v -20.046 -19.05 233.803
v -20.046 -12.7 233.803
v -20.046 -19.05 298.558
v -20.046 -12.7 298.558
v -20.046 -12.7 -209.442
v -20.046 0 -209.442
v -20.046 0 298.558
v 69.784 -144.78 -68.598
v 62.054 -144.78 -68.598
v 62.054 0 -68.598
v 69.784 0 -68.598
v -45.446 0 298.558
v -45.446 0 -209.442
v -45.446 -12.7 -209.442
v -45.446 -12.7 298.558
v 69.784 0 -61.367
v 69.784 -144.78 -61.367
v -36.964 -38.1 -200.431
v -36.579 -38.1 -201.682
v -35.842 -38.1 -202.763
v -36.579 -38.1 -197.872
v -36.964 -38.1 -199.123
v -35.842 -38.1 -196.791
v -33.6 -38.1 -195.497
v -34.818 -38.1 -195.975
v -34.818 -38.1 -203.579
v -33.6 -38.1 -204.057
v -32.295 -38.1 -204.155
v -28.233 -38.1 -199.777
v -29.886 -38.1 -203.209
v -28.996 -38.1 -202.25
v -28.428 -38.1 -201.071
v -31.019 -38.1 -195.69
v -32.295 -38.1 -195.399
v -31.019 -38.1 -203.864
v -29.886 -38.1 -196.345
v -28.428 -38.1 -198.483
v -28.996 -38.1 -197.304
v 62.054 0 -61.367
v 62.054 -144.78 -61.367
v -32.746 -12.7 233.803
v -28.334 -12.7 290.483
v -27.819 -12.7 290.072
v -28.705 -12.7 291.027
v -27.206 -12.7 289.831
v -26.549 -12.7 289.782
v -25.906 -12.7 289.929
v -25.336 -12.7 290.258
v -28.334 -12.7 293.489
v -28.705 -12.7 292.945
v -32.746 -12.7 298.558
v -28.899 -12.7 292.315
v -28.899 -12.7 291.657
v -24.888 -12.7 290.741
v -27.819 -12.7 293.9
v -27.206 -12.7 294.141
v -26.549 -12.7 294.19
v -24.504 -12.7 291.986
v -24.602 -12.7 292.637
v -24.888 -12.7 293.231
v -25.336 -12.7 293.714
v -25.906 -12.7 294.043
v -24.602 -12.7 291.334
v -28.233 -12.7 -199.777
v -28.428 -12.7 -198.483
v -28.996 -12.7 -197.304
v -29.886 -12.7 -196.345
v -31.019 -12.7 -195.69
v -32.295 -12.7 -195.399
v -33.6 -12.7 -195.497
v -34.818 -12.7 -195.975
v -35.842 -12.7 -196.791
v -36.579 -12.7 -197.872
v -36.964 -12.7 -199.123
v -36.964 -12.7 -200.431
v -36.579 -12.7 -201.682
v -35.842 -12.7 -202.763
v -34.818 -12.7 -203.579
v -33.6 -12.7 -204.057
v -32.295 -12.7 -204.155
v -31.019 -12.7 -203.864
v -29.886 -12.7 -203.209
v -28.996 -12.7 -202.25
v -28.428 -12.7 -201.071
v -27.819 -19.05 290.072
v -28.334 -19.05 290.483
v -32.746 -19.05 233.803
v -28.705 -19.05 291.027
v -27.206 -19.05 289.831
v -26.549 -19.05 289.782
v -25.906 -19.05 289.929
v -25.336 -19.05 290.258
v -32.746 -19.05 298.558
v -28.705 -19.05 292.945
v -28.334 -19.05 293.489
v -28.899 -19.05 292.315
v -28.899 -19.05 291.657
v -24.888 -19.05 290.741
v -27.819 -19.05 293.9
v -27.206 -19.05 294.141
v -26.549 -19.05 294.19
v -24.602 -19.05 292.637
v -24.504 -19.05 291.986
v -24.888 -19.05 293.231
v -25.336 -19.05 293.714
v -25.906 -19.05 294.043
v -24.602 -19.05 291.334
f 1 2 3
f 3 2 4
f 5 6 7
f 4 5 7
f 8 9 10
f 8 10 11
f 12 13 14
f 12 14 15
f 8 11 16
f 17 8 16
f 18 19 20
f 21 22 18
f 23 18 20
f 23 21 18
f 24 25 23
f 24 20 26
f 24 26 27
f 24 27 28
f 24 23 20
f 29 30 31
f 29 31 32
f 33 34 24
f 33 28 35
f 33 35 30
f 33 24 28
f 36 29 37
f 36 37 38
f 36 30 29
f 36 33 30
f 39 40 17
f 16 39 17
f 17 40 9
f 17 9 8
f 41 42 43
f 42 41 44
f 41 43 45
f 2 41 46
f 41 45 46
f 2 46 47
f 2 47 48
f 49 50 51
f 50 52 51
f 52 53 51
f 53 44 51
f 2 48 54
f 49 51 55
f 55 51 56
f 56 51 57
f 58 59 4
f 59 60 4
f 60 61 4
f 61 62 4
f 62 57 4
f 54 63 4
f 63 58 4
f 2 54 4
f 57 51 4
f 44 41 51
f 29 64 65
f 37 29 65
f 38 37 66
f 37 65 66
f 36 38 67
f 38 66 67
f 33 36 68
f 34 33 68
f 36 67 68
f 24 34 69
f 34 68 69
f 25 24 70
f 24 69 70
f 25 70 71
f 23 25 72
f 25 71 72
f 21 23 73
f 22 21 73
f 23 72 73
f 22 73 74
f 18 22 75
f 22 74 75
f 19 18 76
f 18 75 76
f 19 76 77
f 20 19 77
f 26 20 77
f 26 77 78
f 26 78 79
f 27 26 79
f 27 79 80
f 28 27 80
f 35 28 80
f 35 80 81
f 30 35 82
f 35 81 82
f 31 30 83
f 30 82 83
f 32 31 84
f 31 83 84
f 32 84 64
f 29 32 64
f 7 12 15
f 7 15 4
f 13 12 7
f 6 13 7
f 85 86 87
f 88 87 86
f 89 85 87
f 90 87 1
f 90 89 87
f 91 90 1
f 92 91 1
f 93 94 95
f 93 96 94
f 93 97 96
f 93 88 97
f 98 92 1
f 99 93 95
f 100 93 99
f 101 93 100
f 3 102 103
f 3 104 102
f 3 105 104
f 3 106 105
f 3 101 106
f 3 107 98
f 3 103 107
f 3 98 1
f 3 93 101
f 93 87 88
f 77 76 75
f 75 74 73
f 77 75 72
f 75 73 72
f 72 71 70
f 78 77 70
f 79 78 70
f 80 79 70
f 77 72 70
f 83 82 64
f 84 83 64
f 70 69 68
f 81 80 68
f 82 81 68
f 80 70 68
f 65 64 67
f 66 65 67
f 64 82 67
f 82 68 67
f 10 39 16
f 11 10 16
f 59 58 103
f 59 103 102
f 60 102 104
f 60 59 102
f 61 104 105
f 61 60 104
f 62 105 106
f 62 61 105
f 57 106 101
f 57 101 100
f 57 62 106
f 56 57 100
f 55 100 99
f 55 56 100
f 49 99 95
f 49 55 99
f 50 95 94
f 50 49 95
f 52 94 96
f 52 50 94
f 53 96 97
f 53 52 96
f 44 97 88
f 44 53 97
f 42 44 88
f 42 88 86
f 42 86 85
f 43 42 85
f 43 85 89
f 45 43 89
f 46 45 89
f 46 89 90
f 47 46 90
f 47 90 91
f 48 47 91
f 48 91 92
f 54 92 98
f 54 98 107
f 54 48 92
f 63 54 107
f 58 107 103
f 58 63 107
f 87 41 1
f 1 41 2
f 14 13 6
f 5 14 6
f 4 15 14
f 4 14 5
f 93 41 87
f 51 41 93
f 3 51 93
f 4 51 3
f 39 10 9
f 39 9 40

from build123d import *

# Parameters (mm, degrees)
F0_W     = 25.4
F0_H     = 508
F1_DEPTH = 12.7
F3_W     = 12.7
F3_H     = 64.754932
F3_R     = 2.210063
F4_DEPTH = 6.35
F5_R     = 4.390149
F6_DEPTH = 25.4
F7_W     = 7.729698
F7_H     = 7.230431
F8_DEPTH = 144.78


with BuildPart() as f1:
    # F0 (on Front) → F1 (new body)
    with BuildSketch(Plane.XZ):
        with Locations((-32.746281, 44.557519)):
            Rectangle(F0_W, F0_H)
    extrude(amount=F1_DEPTH)


with BuildPart() as f4:
    # F3 (on face) → F4 (new body)
    with BuildSketch(Plane.XZ.offset(12.7)):
        with Locations((-26.396281, 266.180053)):
            Rectangle(F3_W, F3_H)
        with Locations((-26.713759, 291.985899)):
            Circle(F3_R, mode=Mode.SUBTRACT)
    extrude(amount=F4_DEPTH)


with BuildPart() as f6:
    # F5 (on face) → F6 (new body)
    with BuildSketch(Plane.XZ.offset(12.7)):
        with Locations((-32.623317, -199.777067)):
            Circle(F5_R)
    extrude(amount=F6_DEPTH)


with BuildPart() as f8:
    # F7 (on Front) → F8 (new body)
    with BuildSketch(Plane.XZ):
        with Locations((65.918995, -64.982362)):
            Rectangle(F7_W, F7_H)
    extrude(amount=F8_DEPTH)


solid = Compound([f1.part, f4.part, f6.part, f8.part])
